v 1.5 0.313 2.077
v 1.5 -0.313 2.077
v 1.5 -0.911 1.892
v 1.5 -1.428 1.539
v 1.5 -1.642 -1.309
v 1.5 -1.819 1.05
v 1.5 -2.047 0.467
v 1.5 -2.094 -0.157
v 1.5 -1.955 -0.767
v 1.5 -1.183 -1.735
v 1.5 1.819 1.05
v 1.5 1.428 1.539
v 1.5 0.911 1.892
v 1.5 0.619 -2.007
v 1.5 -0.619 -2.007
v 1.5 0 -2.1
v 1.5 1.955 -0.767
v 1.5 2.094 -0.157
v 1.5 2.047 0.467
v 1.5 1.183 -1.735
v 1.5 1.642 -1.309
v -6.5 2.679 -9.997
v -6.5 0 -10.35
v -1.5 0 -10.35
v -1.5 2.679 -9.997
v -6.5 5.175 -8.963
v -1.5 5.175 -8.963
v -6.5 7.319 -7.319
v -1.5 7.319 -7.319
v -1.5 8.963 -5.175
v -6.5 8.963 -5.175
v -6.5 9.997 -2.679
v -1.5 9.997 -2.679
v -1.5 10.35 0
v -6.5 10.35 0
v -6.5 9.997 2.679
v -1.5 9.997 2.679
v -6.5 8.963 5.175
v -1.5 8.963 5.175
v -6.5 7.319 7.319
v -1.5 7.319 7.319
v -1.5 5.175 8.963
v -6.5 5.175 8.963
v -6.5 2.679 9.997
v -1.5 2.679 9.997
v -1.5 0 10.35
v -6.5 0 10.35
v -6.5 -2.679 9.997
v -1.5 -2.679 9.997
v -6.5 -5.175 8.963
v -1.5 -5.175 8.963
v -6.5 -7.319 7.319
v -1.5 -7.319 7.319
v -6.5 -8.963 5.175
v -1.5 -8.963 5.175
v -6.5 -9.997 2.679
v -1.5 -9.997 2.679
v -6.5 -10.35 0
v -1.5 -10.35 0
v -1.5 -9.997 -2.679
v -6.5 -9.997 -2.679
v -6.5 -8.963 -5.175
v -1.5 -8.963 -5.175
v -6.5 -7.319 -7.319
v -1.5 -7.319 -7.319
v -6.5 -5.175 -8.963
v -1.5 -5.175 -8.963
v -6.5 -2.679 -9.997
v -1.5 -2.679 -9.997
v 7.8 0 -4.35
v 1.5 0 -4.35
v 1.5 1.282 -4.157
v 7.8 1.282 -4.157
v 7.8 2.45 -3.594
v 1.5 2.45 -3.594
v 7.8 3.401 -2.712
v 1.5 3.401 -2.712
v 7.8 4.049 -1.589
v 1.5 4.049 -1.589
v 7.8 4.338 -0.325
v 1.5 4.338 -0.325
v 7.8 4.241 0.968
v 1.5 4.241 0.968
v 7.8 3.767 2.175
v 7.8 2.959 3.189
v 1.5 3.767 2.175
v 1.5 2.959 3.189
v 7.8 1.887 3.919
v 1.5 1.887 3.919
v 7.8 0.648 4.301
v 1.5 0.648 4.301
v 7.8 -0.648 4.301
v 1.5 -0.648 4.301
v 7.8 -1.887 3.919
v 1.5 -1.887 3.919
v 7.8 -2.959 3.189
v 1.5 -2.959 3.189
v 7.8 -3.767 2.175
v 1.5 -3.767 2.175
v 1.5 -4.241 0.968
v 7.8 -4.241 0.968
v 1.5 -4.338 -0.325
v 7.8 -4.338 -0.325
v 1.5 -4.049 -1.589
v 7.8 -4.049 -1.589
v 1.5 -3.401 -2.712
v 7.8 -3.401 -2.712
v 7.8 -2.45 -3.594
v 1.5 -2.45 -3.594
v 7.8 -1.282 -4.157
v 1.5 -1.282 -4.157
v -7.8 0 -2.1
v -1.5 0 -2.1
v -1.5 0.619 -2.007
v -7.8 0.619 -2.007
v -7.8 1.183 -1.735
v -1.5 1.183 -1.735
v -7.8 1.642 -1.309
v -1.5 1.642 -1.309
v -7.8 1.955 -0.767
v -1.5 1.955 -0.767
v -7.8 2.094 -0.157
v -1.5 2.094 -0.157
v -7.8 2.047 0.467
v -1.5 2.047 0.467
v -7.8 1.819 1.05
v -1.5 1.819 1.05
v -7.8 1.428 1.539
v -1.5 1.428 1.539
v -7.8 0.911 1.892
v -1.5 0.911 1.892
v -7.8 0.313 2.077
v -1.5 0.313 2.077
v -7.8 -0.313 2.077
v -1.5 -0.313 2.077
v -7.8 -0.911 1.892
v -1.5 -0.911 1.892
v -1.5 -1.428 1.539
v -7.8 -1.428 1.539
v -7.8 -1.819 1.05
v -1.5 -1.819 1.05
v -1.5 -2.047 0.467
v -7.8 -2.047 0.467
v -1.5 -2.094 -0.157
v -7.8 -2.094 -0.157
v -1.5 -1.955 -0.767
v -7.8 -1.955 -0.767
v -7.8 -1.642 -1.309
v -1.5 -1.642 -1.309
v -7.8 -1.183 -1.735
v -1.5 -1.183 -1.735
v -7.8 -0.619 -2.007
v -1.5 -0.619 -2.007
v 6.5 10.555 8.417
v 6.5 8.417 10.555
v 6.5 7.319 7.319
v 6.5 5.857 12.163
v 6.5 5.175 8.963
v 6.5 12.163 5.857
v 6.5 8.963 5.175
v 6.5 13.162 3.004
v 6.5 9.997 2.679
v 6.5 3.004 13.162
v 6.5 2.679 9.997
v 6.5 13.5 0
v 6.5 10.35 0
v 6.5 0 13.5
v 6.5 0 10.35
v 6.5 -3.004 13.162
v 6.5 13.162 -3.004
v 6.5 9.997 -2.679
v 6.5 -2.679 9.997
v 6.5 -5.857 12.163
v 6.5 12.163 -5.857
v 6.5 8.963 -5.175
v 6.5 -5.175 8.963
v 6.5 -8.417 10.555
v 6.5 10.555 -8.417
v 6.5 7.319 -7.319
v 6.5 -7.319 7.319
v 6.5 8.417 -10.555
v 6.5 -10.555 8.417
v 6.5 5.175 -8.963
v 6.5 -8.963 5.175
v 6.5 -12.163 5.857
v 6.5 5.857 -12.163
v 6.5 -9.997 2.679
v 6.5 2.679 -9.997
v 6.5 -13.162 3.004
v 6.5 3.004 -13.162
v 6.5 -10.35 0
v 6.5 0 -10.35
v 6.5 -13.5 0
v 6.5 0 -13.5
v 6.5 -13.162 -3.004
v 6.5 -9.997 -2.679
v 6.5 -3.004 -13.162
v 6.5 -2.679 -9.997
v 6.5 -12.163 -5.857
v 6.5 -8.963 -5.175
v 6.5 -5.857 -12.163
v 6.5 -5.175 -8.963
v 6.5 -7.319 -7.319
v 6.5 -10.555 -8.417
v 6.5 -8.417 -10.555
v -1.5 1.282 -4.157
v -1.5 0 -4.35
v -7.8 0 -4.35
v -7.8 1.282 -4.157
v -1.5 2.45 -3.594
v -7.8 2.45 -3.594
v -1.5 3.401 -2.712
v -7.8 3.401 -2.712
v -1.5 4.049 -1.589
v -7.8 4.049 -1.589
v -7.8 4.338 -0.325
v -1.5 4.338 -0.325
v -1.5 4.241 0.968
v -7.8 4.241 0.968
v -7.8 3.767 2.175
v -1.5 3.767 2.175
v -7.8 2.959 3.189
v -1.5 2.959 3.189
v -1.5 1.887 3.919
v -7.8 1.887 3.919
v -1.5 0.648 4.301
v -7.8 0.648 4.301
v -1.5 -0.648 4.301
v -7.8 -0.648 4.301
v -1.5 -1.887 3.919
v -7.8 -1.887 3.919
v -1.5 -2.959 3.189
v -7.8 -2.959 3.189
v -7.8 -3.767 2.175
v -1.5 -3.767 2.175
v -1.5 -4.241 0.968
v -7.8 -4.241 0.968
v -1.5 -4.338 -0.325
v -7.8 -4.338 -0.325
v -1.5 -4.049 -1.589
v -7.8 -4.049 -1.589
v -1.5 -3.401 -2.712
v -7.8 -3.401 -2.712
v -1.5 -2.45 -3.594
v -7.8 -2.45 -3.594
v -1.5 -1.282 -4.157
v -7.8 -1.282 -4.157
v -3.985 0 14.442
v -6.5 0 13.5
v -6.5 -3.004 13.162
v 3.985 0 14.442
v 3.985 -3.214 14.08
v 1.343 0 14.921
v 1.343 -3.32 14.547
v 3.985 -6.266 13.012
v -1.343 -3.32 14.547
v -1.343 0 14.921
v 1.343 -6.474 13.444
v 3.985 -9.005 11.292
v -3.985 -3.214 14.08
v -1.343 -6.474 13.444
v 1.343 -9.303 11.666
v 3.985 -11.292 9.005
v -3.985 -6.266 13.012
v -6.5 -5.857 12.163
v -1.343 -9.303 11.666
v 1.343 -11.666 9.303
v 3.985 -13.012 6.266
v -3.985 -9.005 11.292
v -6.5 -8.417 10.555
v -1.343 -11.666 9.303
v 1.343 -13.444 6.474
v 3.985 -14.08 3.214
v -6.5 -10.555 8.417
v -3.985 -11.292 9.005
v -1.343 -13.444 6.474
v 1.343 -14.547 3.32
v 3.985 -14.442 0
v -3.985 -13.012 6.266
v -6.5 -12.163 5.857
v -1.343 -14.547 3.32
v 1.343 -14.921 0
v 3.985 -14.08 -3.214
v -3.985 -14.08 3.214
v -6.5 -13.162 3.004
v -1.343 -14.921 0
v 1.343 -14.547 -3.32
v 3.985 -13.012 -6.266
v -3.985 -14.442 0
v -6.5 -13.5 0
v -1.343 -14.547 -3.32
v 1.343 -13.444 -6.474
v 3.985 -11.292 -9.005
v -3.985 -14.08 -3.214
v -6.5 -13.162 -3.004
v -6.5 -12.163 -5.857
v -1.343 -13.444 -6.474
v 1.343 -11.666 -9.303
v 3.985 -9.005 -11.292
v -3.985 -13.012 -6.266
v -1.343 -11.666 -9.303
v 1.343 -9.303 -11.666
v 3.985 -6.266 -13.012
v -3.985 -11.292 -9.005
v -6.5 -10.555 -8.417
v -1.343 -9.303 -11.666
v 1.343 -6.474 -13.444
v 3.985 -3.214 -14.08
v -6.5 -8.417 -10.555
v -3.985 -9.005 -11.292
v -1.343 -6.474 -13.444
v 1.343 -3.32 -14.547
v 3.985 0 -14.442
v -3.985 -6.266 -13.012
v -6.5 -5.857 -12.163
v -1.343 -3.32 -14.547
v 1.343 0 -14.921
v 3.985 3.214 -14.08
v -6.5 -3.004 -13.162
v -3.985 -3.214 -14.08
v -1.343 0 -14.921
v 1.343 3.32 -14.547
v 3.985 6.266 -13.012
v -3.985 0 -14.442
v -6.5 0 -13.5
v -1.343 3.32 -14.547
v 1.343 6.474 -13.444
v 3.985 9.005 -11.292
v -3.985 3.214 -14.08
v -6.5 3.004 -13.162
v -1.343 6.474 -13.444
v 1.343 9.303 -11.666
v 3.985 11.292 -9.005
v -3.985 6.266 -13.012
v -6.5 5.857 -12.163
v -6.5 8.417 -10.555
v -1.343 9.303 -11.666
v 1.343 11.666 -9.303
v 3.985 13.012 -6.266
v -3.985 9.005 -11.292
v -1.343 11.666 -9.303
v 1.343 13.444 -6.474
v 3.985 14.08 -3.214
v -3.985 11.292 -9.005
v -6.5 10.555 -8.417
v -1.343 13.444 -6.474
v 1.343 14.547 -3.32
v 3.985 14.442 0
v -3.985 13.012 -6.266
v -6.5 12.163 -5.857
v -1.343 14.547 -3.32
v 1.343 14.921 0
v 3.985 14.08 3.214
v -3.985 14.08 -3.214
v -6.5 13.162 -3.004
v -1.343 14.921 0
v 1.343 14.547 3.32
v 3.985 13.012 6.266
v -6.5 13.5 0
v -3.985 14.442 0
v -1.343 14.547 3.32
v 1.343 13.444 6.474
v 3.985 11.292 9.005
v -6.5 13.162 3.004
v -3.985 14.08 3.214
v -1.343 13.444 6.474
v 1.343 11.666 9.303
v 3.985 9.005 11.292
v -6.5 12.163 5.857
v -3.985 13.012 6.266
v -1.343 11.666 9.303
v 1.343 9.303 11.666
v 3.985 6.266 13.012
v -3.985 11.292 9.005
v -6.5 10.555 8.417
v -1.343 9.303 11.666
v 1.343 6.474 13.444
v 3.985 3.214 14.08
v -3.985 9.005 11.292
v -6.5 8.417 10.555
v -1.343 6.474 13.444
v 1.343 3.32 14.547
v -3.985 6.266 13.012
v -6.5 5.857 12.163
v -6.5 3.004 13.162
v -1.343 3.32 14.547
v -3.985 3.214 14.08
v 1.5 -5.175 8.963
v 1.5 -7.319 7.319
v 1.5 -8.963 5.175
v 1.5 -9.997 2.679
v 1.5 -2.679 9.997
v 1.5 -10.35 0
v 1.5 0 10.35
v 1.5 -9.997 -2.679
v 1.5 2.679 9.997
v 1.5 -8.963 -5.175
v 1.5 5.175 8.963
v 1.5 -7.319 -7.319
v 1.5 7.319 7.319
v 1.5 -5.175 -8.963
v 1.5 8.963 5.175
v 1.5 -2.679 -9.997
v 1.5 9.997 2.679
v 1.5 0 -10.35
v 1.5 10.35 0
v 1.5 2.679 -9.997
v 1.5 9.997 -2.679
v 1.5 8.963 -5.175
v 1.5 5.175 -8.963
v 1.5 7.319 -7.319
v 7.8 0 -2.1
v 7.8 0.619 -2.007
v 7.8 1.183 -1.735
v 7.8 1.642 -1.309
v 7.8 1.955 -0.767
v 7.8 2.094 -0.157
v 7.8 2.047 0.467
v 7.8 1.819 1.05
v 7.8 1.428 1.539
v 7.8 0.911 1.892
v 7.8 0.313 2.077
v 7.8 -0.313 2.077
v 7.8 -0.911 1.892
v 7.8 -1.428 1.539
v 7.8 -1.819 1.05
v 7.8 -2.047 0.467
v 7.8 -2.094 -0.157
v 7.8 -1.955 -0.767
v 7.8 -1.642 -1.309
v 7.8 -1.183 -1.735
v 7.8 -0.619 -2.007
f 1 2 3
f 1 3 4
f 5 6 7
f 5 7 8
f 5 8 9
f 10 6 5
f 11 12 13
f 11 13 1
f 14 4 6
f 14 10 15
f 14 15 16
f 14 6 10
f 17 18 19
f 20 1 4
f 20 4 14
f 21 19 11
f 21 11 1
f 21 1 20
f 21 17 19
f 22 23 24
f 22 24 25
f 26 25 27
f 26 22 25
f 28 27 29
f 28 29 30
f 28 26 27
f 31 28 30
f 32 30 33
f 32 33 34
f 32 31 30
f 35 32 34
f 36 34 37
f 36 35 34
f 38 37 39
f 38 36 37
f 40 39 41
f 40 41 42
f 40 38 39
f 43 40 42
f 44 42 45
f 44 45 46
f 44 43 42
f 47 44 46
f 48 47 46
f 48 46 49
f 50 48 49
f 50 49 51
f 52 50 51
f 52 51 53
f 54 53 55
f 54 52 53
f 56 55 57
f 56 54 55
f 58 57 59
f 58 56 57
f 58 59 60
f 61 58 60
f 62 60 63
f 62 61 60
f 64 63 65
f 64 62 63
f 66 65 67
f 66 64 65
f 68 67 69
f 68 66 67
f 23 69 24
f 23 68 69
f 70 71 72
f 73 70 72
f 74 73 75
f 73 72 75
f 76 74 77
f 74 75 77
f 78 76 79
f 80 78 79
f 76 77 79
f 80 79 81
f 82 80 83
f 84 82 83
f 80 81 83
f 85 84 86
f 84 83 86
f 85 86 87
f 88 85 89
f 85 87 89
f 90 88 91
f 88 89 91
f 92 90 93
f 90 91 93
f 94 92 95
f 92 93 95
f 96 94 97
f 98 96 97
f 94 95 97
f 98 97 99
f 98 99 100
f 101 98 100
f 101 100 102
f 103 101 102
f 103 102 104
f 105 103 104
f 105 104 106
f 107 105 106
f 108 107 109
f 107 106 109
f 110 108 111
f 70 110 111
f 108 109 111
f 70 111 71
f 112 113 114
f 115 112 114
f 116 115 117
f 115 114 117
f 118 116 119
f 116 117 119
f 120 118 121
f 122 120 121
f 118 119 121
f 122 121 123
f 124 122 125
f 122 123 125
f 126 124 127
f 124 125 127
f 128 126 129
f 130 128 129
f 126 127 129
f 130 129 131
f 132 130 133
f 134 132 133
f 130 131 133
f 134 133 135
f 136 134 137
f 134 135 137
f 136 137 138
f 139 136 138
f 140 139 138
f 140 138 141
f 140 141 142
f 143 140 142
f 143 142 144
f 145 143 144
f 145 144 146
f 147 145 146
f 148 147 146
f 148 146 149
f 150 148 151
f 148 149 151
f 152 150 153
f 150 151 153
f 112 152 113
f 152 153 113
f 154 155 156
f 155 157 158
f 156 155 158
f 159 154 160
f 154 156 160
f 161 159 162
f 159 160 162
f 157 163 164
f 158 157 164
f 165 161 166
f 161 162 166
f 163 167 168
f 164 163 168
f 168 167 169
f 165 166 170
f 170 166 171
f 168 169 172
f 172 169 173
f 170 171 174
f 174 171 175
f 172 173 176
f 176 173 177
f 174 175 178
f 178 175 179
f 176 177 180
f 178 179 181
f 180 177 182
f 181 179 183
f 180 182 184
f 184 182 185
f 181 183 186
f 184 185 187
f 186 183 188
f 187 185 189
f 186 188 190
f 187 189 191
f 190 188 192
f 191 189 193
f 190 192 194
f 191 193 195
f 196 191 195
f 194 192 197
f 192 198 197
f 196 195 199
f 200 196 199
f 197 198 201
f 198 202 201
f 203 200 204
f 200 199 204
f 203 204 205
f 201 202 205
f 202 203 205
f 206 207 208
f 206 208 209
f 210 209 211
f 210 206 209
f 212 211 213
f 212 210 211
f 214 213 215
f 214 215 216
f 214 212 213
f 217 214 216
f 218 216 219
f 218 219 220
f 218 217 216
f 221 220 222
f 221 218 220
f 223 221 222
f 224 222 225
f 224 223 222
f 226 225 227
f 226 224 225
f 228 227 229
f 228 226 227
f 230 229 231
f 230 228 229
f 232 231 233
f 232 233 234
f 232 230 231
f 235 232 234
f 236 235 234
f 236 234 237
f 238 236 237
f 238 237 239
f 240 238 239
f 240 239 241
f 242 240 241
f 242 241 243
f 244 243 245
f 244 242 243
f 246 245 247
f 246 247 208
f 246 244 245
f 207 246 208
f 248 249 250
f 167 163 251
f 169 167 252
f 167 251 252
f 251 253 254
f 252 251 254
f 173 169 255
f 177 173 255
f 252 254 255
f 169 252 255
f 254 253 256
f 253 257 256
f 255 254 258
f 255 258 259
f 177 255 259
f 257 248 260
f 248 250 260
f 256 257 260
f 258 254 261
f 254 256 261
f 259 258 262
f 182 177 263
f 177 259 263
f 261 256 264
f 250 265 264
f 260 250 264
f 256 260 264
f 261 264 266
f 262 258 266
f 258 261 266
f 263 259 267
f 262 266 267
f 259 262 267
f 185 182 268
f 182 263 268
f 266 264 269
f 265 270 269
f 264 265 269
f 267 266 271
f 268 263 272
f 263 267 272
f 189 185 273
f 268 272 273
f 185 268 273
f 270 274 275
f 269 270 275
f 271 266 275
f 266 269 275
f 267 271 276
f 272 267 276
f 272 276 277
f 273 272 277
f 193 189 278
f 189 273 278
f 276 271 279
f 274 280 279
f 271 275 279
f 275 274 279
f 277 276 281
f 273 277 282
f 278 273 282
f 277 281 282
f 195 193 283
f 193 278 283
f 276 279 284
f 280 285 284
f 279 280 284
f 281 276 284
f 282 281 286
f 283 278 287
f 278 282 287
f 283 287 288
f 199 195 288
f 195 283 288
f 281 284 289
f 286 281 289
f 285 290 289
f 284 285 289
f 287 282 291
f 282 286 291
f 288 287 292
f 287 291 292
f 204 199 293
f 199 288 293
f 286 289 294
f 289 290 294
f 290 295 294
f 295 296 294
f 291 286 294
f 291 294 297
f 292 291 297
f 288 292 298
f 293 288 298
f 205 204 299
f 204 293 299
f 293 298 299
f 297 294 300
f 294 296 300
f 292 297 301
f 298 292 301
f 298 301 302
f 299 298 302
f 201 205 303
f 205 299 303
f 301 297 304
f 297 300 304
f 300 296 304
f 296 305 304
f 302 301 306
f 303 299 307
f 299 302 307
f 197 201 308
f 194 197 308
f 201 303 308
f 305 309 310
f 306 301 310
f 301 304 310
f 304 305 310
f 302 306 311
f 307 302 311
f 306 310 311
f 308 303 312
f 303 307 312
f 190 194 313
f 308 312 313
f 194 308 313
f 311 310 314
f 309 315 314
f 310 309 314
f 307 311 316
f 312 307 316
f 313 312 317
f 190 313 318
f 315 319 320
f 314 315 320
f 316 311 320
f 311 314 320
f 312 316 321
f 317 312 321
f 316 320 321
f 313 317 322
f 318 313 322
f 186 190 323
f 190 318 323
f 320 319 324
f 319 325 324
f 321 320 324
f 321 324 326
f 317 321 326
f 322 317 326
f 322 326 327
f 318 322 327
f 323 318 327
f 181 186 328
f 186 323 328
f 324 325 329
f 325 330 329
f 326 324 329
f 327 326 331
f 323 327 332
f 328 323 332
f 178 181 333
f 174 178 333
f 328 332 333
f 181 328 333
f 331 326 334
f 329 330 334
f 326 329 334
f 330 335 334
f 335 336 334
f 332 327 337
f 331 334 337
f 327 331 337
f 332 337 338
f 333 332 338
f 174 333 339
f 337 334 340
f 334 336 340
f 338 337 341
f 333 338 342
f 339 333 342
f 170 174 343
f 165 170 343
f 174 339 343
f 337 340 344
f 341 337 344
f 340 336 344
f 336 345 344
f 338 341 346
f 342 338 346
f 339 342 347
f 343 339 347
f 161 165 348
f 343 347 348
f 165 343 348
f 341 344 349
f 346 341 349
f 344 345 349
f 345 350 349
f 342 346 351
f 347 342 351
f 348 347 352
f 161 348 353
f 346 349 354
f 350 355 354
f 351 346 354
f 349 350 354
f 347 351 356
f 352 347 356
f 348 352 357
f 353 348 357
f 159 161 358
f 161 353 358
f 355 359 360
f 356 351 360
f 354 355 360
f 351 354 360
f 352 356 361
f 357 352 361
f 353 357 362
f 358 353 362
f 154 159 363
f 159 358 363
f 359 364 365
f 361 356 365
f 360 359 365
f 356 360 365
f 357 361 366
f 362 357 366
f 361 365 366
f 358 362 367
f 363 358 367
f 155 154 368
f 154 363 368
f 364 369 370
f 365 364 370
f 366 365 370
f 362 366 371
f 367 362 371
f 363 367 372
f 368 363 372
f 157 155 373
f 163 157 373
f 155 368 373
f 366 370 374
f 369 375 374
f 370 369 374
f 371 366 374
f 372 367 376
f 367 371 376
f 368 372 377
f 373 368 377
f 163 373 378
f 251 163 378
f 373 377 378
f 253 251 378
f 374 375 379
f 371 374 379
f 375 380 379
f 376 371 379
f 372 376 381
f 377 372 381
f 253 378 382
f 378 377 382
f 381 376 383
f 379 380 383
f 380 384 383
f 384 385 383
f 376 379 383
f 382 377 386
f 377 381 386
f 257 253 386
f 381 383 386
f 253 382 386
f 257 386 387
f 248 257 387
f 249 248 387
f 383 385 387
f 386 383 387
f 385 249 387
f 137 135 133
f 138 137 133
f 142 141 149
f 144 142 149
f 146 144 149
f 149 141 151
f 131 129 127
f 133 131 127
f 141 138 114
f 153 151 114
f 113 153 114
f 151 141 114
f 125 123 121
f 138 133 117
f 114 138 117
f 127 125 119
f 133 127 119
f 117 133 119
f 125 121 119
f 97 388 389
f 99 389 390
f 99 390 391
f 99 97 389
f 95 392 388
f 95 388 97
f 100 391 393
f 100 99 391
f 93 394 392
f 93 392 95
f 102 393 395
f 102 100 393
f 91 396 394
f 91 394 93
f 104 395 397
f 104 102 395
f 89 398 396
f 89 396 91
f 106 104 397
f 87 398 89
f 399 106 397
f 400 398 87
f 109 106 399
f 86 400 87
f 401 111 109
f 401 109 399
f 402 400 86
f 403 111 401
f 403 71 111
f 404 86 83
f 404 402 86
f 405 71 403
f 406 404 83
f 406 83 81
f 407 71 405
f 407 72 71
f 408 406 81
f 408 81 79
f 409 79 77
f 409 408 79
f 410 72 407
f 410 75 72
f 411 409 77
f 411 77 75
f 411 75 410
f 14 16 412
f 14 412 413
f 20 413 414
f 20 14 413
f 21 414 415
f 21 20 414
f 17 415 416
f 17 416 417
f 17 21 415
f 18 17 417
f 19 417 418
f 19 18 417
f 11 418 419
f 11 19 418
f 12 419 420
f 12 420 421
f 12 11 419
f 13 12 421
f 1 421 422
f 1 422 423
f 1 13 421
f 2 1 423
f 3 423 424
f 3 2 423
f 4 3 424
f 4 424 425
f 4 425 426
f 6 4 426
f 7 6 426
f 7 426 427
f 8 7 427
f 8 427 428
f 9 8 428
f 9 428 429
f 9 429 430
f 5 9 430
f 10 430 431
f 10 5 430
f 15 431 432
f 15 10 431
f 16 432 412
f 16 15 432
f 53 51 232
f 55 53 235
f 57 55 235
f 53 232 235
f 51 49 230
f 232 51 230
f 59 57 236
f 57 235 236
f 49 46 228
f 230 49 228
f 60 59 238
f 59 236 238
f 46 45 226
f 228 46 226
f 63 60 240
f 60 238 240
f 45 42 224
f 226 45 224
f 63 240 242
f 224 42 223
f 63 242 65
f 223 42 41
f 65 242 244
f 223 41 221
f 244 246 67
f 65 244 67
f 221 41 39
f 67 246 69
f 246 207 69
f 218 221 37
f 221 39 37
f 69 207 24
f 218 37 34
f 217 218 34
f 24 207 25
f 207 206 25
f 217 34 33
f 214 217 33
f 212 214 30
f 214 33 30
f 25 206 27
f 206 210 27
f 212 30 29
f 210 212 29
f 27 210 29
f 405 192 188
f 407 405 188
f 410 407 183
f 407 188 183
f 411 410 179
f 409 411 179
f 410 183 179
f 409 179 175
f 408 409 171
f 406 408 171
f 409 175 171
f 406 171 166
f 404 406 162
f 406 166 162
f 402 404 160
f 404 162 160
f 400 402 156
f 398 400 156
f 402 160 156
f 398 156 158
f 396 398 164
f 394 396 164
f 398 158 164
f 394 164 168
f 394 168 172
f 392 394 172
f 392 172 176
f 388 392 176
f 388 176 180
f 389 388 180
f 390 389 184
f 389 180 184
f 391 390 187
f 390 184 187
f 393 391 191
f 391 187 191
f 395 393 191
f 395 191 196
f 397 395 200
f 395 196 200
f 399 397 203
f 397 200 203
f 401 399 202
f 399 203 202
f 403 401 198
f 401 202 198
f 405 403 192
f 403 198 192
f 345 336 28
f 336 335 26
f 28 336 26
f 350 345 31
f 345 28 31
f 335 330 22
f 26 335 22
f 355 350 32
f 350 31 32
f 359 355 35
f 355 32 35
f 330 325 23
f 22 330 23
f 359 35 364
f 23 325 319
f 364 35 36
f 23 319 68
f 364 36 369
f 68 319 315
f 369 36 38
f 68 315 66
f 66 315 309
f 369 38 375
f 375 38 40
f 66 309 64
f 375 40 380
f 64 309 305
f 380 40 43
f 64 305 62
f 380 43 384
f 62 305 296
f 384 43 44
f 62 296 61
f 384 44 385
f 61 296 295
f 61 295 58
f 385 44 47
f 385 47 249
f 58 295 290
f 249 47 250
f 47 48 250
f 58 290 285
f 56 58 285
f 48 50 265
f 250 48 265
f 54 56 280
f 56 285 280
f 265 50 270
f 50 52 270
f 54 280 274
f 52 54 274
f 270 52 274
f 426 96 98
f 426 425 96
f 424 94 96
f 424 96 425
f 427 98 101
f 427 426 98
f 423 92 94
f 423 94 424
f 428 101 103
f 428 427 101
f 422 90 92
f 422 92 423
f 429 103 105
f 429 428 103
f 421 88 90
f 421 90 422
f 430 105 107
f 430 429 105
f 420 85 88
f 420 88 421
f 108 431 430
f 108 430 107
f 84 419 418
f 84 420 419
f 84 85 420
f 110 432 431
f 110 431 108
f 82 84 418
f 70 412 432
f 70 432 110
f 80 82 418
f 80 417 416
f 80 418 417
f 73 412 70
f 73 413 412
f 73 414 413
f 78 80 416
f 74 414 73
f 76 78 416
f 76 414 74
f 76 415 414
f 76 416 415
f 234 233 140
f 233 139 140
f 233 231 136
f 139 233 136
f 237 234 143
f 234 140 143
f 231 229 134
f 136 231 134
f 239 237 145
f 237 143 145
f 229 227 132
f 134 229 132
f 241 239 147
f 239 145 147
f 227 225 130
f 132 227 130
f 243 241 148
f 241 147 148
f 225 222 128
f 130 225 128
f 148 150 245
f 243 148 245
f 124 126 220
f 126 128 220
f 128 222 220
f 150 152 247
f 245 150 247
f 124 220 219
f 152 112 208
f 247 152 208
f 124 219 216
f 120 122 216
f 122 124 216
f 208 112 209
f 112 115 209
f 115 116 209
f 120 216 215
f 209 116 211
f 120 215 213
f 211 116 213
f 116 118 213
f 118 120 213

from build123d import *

# Parameters (mm, degrees)
SKETCH6_R           = 10.35
CUT_EXTRUDE1_DEPTH  = 5
SKETCH7_R           = 4.35
SKETCH7_R_2         = 2.1
BOSS_EXTRUDE3_DEPTH = 6.3


with BuildPart() as part:
    # Sketch5 → Revolve1 (revolve)
    with BuildSketch(Plane.XY, mode=Mode.PRIVATE) as revolve1_sk:
        with BuildLine():
            Line((6.5, 0), (6.5, 13.5))
            ThreePointArc((6.5, 13.5), (0, 14.981494165), (-6.5, 13.5))
            Line((-6.5, 13.5), (-6.5, 0))
            Line((-6.5, 0), (6.5, 0))
        make_face()
    revolve(revolve1_sk.sketch.rotate(Axis((-6.5, 0, 0), (1, 0, 0)), 90), axis=Axis((-6.5, 0, 0), (1, 0, 0)))

    # Sketch6 → Cut-Extrude1 (cut)
    with BuildSketch(Plane(origin=(6.5, 0, 0), x_dir=(0, 0, -1), z_dir=(1, 0, 0))):
        Circle(SKETCH6_R)
    cut_extrude1 = extrude(amount=-CUT_EXTRUDE1_DEPTH, mode=Mode.SUBTRACT)

    # Sketch7 → Boss-Extrude3 (add)
    with BuildSketch(Plane(origin=(1.5, 0, 0), x_dir=(0, 0, -1), z_dir=(1, 0, 0))):
        Circle(SKETCH7_R)
        Circle(SKETCH7_R_2, mode=Mode.SUBTRACT)
    boss_extrude3 = extrude(amount=BOSS_EXTRUDE3_DEPTH)

    # Mirror2: Cut-Extrude1, Boss-Extrude3 across plane
    add(cut_extrude1.mirror(Plane(origin=(0, 0, 0), x_dir=(0, 0, 1), z_dir=(1, 0, 0))), mode=Mode.SUBTRACT)
    add(boss_extrude3.mirror(Plane(origin=(0, 0, 0), x_dir=(0, 0, 1), z_dir=(1, 0, 0))))


solid = part.part
